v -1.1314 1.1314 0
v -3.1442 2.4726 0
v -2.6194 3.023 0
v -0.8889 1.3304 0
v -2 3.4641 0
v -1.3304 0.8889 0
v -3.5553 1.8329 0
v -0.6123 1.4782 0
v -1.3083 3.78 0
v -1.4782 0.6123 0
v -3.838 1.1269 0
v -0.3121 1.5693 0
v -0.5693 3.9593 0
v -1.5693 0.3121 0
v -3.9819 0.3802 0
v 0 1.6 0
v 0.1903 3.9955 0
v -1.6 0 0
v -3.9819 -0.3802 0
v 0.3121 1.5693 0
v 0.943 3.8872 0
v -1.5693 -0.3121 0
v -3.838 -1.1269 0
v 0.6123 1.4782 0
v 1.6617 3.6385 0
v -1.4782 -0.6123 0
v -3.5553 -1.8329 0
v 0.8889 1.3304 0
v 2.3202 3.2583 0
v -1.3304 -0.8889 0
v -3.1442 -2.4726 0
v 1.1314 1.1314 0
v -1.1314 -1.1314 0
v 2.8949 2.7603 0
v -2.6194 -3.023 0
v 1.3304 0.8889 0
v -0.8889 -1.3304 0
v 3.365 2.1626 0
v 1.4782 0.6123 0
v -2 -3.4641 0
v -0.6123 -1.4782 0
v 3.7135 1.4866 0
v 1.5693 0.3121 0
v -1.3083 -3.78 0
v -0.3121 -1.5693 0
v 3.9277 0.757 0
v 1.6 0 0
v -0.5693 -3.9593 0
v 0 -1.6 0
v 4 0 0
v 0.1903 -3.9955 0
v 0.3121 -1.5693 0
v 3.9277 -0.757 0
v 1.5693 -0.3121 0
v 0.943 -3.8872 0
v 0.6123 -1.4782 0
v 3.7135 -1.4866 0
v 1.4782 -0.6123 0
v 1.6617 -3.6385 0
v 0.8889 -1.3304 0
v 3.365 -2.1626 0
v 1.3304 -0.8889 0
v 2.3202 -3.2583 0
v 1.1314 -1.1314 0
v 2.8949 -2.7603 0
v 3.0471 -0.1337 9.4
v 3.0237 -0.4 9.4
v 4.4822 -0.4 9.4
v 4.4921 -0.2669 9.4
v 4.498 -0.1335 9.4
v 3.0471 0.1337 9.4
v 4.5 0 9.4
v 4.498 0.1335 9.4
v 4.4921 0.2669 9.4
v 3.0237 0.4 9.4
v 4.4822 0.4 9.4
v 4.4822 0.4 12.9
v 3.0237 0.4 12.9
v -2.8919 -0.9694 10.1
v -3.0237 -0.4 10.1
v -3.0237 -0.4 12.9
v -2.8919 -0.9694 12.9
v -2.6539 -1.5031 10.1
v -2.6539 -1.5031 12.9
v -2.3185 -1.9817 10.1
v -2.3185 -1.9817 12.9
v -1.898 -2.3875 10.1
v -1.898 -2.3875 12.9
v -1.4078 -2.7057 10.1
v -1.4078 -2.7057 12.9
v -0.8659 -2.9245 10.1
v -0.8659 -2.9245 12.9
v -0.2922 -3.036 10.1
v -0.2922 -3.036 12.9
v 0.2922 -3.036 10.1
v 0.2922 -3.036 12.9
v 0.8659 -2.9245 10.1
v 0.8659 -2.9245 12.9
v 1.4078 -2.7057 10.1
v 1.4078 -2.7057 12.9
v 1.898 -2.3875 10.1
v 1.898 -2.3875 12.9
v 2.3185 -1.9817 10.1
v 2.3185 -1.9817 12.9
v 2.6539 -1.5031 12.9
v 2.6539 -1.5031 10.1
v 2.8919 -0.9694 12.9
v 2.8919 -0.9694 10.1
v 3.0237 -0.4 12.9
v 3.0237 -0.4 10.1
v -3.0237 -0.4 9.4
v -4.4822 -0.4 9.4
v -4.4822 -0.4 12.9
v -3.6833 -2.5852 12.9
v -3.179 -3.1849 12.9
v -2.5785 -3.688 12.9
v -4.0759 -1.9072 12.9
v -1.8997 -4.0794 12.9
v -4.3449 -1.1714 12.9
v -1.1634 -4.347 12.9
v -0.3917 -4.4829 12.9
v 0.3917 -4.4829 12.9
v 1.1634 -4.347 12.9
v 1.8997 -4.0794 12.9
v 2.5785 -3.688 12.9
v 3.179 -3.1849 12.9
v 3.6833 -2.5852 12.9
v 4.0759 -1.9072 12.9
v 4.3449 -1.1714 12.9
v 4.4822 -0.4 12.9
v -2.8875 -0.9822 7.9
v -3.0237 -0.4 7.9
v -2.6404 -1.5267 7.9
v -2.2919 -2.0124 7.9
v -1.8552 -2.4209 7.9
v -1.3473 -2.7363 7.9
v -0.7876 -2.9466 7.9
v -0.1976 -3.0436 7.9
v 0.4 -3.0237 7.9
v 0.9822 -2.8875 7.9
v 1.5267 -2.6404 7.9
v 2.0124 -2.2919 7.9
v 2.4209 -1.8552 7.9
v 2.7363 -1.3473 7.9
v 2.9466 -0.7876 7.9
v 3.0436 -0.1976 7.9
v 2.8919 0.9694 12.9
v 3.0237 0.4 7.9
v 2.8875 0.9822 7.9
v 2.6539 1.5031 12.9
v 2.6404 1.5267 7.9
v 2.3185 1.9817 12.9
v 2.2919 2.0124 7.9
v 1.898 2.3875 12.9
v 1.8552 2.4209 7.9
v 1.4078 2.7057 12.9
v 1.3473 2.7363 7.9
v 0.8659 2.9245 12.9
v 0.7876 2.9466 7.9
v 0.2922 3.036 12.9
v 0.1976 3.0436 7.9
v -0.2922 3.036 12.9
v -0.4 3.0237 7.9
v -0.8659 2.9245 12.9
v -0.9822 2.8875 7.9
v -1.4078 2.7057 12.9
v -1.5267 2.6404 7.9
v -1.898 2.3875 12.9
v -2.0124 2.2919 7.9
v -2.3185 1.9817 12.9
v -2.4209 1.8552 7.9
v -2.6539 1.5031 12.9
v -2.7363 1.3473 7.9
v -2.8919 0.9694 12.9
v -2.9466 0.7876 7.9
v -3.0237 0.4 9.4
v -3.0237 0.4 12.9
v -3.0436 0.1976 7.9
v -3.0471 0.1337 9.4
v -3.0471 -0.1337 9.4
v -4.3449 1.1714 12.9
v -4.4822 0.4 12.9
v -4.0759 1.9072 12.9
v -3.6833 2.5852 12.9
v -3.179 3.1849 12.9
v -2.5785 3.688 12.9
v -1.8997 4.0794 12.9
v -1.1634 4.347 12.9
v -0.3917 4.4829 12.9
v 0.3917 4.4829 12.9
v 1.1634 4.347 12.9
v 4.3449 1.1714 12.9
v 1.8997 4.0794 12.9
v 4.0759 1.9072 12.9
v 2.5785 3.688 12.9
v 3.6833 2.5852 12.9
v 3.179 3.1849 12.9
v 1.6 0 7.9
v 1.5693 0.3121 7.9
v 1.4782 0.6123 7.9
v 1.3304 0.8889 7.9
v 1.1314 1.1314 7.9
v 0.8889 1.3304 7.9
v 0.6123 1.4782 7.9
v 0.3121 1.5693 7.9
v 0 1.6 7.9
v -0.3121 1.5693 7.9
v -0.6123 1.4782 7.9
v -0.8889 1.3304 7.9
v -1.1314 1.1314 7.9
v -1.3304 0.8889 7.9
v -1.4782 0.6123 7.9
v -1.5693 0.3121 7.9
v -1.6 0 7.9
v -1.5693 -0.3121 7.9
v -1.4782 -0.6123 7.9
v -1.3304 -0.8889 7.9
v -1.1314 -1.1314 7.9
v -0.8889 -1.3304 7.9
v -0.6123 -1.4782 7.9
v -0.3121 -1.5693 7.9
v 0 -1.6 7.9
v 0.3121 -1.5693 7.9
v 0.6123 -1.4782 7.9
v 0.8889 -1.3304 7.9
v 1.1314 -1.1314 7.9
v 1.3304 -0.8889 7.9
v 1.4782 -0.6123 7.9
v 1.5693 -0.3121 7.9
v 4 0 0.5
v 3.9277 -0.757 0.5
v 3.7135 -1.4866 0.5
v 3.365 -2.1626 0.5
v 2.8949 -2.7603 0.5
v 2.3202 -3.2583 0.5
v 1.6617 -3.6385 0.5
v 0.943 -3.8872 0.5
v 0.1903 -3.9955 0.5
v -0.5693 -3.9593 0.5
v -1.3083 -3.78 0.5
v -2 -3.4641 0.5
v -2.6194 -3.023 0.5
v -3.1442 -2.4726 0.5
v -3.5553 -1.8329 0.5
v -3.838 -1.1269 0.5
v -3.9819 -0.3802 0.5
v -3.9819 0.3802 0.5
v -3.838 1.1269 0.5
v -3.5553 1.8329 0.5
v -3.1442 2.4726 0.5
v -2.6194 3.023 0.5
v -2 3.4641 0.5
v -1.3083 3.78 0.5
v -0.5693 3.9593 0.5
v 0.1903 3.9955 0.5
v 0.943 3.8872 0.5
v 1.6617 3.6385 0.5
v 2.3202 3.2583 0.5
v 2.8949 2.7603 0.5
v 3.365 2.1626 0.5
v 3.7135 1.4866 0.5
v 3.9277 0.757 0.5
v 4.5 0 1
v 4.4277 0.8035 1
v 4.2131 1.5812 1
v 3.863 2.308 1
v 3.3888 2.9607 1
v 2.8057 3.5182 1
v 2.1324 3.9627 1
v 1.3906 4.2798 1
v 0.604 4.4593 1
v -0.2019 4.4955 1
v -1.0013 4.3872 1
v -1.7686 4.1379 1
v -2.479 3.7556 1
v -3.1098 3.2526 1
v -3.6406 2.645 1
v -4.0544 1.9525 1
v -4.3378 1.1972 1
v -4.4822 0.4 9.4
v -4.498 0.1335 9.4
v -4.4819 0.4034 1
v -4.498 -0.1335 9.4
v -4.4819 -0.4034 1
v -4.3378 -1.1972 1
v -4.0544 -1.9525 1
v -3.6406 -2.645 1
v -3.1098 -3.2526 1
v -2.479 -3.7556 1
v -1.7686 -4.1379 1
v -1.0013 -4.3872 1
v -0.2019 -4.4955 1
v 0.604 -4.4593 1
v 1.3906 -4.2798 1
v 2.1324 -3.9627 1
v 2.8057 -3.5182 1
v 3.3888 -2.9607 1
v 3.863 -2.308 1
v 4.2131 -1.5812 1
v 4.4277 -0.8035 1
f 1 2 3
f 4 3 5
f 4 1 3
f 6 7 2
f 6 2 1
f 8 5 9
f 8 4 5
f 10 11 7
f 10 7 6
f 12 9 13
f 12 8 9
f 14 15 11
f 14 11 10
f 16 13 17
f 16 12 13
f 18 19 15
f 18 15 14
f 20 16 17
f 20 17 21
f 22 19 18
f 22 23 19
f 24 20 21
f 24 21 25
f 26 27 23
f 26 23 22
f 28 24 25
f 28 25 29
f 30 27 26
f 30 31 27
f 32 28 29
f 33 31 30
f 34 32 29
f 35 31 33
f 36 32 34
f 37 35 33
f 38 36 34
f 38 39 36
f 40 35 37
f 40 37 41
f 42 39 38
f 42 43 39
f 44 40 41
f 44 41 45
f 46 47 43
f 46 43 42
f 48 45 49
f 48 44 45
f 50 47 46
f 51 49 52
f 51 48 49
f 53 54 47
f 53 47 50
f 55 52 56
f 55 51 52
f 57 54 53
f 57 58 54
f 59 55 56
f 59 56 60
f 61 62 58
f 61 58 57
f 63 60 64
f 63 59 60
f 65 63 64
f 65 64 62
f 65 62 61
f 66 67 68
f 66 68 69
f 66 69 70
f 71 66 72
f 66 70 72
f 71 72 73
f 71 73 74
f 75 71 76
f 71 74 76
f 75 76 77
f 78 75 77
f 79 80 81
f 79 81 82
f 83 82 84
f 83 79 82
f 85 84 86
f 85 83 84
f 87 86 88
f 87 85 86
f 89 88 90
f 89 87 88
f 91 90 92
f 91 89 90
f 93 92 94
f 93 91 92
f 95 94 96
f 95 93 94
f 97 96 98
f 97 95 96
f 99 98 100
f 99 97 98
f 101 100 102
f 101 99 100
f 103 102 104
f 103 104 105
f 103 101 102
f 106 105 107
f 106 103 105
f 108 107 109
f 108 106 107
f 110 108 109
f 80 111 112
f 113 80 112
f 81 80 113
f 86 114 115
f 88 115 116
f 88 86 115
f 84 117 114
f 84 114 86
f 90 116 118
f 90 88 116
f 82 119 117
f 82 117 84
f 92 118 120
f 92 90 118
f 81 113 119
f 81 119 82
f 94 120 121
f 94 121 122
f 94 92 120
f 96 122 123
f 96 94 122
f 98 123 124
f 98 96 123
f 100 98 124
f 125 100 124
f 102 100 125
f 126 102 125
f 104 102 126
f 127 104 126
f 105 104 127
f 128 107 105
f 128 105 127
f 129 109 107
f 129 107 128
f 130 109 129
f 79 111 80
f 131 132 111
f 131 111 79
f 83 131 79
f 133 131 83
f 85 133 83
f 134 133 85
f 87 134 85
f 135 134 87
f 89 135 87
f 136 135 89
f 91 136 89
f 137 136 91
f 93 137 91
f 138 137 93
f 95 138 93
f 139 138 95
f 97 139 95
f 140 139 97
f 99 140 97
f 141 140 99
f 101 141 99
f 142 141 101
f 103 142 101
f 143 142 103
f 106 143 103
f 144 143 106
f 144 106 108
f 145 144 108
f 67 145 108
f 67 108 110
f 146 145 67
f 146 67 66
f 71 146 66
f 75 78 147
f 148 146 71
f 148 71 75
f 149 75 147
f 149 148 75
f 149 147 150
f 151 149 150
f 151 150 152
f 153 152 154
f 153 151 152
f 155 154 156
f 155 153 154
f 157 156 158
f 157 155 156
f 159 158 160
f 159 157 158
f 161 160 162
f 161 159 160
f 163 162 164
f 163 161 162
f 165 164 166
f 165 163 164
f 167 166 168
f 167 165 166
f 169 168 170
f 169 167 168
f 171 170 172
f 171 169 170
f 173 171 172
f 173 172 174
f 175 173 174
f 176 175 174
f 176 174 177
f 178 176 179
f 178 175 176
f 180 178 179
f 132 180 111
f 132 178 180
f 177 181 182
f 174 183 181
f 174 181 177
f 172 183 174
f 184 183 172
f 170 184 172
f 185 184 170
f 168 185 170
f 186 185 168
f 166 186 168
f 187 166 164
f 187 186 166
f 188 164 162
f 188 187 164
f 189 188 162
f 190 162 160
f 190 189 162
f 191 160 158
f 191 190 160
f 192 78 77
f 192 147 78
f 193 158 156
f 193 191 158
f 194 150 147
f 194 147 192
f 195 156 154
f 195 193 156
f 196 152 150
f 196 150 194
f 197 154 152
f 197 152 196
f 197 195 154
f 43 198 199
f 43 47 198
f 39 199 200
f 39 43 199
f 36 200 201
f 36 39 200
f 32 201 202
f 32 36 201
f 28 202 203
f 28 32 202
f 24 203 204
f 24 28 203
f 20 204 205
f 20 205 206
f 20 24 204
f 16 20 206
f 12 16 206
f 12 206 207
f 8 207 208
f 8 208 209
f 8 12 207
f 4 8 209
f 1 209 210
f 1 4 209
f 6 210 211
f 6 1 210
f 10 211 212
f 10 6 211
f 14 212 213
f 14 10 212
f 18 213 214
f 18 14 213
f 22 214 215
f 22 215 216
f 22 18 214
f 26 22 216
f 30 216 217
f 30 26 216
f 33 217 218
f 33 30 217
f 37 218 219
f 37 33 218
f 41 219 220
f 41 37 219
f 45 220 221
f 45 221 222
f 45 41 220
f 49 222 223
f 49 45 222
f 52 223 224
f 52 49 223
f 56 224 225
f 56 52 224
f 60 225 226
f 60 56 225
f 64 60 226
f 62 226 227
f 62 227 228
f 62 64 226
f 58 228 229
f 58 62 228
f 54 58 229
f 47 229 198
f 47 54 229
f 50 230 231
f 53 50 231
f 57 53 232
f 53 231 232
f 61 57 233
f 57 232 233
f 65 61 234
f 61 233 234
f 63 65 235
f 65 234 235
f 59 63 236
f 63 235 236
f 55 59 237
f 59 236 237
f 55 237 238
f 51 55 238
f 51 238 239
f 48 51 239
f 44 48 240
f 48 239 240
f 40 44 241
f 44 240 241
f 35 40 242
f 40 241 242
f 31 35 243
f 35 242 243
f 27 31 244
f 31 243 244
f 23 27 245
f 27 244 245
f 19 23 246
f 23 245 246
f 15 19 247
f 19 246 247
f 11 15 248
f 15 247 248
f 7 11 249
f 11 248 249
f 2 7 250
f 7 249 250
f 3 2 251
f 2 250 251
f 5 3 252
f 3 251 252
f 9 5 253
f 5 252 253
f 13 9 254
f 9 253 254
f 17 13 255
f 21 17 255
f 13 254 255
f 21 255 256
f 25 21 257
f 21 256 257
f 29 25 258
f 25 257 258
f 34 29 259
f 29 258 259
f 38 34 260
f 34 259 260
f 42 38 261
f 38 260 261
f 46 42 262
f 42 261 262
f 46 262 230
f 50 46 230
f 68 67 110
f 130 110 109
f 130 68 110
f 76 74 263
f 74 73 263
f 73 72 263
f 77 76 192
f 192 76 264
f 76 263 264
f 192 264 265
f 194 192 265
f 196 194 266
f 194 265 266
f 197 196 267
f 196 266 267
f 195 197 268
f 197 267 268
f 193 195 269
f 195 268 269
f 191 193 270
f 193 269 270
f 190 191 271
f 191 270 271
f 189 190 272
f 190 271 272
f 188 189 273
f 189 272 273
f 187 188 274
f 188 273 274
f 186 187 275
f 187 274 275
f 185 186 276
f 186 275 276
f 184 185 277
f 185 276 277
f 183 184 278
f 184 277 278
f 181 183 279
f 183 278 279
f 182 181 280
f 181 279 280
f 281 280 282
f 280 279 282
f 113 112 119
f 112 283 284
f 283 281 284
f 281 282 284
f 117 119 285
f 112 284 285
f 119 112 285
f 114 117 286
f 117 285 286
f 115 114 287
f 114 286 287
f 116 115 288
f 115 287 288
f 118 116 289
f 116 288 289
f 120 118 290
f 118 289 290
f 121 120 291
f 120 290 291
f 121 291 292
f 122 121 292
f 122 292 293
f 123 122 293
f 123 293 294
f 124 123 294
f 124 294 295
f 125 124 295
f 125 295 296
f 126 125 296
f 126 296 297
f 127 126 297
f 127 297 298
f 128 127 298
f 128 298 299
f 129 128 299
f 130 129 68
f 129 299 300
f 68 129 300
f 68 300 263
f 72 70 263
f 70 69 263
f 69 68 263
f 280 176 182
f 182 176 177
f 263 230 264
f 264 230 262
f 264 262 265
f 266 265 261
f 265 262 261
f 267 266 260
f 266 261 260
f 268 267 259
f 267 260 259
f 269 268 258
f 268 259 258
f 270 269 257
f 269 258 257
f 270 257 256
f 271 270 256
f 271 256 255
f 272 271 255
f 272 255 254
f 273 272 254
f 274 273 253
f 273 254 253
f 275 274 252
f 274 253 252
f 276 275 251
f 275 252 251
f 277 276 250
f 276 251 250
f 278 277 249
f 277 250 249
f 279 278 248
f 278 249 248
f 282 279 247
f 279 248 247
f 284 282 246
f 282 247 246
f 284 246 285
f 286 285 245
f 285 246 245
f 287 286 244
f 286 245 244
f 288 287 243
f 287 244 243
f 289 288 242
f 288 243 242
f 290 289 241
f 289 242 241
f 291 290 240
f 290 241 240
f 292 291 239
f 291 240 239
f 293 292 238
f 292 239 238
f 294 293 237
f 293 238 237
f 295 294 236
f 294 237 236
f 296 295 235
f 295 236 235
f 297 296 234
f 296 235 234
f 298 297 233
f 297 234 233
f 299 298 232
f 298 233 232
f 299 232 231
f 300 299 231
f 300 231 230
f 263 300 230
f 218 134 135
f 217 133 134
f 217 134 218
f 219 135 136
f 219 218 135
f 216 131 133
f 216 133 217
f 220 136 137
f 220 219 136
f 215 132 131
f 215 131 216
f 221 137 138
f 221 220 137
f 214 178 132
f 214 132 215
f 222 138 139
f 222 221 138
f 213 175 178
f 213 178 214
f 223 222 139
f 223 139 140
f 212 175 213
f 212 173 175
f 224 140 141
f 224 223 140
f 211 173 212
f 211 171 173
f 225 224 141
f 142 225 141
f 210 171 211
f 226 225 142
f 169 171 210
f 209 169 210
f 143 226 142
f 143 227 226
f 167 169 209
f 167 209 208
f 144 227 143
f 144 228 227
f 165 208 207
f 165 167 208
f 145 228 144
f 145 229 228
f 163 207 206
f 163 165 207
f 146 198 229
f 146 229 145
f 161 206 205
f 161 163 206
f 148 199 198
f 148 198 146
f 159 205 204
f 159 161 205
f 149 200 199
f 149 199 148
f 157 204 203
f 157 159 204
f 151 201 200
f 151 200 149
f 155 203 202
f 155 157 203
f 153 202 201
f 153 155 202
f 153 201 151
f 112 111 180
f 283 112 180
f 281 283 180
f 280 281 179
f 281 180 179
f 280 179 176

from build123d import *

# Parameters (mm, degrees)
SKETCH1_R                 = 2.75
SKETCH1_R_2               = 1.6
BOSS_EXTRUDE1_DEPTH       = 0.5
SKETCH2_R                 = 4.5
SKETCH2_R_2               = 1.6
BOSS_EXTRUDE2_DEPTH       = 7.4
CHAMFER1_SIZE             = 0.5
SKETCH3_R                 = 4.5
SKETCH3_R_2               = 2.5
BOSS_EXTRUDE3_DEPTH       = 2.2
SKETCH4_R                 = 4.5
SKETCH4_R_2               = 3.05
BOSS_EXTRUDE4_DEPTH       = 2.8
SKETCH5_W                 = 0.8
SKETCH5_H                 = 3.5
CUT_EXTRUDE1_DEPTH        = 4.5
BOSS_EXTRUDE6_START       = -0.5
BOSS_EXTRUDE6_OUTLINE_R   = 4
BOSS_EXTRUDE6_OUTLINE_R_2 = 2.75
BOSS_EXTRUDE6_DEPTH       = 0.5
CUT_EXTRUDE2_START        = -2.2
SKETCH7_R                 = 3.05
CUT_EXTRUDE2_DEPTH        = 2.2


# Read off the part's stored shape, not the designer's step: Boss-Extrude6
with BuildPart() as part:
    # Sketch1 → Boss-Extrude1 (new body)
    with BuildSketch(Plane(origin=(0, 0, 0), x_dir=(0, 1, 0), z_dir=(0, 0, 1))):
        with Locations(Location((0, 0, 0), (0, 0, 270))):
            Circle(SKETCH1_R)
        with Locations(Location((0, 0, 0), (0, 0, 270))):
            Circle(SKETCH1_R_2, mode=Mode.SUBTRACT)
    extrude(amount=BOSS_EXTRUDE1_DEPTH)

    # Sketch2 → Boss-Extrude2 (add)
    with BuildSketch(Plane.XY.offset(0.5)):
        Circle(SKETCH2_R)
        Circle(SKETCH2_R_2, mode=Mode.SUBTRACT)
    extrude(amount=BOSS_EXTRUDE2_DEPTH)

    # Chamfer1
    chamfer1_edges = [part.edges().sort_by_distance(p)[0] for p in [
        (-4.5, 0, 0.5),
    ]]
    chamfer(chamfer1_edges, length=CHAMFER1_SIZE)

    # Sketch3 → Boss-Extrude3 (add)
    with BuildSketch(Plane.XY.offset(7.9)):
        Circle(SKETCH3_R)
        Circle(SKETCH3_R_2, mode=Mode.SUBTRACT)
    extrude(amount=BOSS_EXTRUDE3_DEPTH)

    # Sketch4 → Boss-Extrude4 (add)
    with BuildSketch(Plane.XY.offset(10.1)):
        Circle(SKETCH4_R)
        Circle(SKETCH4_R_2, mode=Mode.SUBTRACT)
    extrude(amount=BOSS_EXTRUDE4_DEPTH)

    # Sketch5 → Cut-Extrude1 (cut, symmetric)
    with BuildSketch(Plane.YZ):
        with Locations((0, 11.15)):
            Rectangle(SKETCH5_W, SKETCH5_H)
    extrude(amount=CUT_EXTRUDE1_DEPTH, both=True, mode=Mode.SUBTRACT)

    # Boss-Extrude6 outline → Boss-Extrude6 (add)
    with BuildSketch(Plane(origin=(0, 0, 0), x_dir=(1, 0, 0), z_dir=(0, 0, -1)).offset(BOSS_EXTRUDE6_START)):
        Circle(BOSS_EXTRUDE6_OUTLINE_R)
        Circle(BOSS_EXTRUDE6_OUTLINE_R_2, mode=Mode.SUBTRACT)
    extrude(amount=BOSS_EXTRUDE6_DEPTH)

    # Sketch7 → Cut-Extrude2 (cut)
    with BuildSketch(Plane.XY.offset(10.1).offset(CUT_EXTRUDE2_START)):
        with Locations(Location((0, 0, 0), (0, 0, 187.535909342))):
            Circle(SKETCH7_R)
    extrude(amount=CUT_EXTRUDE2_DEPTH, mode=Mode.SUBTRACT)


solid = part.part
